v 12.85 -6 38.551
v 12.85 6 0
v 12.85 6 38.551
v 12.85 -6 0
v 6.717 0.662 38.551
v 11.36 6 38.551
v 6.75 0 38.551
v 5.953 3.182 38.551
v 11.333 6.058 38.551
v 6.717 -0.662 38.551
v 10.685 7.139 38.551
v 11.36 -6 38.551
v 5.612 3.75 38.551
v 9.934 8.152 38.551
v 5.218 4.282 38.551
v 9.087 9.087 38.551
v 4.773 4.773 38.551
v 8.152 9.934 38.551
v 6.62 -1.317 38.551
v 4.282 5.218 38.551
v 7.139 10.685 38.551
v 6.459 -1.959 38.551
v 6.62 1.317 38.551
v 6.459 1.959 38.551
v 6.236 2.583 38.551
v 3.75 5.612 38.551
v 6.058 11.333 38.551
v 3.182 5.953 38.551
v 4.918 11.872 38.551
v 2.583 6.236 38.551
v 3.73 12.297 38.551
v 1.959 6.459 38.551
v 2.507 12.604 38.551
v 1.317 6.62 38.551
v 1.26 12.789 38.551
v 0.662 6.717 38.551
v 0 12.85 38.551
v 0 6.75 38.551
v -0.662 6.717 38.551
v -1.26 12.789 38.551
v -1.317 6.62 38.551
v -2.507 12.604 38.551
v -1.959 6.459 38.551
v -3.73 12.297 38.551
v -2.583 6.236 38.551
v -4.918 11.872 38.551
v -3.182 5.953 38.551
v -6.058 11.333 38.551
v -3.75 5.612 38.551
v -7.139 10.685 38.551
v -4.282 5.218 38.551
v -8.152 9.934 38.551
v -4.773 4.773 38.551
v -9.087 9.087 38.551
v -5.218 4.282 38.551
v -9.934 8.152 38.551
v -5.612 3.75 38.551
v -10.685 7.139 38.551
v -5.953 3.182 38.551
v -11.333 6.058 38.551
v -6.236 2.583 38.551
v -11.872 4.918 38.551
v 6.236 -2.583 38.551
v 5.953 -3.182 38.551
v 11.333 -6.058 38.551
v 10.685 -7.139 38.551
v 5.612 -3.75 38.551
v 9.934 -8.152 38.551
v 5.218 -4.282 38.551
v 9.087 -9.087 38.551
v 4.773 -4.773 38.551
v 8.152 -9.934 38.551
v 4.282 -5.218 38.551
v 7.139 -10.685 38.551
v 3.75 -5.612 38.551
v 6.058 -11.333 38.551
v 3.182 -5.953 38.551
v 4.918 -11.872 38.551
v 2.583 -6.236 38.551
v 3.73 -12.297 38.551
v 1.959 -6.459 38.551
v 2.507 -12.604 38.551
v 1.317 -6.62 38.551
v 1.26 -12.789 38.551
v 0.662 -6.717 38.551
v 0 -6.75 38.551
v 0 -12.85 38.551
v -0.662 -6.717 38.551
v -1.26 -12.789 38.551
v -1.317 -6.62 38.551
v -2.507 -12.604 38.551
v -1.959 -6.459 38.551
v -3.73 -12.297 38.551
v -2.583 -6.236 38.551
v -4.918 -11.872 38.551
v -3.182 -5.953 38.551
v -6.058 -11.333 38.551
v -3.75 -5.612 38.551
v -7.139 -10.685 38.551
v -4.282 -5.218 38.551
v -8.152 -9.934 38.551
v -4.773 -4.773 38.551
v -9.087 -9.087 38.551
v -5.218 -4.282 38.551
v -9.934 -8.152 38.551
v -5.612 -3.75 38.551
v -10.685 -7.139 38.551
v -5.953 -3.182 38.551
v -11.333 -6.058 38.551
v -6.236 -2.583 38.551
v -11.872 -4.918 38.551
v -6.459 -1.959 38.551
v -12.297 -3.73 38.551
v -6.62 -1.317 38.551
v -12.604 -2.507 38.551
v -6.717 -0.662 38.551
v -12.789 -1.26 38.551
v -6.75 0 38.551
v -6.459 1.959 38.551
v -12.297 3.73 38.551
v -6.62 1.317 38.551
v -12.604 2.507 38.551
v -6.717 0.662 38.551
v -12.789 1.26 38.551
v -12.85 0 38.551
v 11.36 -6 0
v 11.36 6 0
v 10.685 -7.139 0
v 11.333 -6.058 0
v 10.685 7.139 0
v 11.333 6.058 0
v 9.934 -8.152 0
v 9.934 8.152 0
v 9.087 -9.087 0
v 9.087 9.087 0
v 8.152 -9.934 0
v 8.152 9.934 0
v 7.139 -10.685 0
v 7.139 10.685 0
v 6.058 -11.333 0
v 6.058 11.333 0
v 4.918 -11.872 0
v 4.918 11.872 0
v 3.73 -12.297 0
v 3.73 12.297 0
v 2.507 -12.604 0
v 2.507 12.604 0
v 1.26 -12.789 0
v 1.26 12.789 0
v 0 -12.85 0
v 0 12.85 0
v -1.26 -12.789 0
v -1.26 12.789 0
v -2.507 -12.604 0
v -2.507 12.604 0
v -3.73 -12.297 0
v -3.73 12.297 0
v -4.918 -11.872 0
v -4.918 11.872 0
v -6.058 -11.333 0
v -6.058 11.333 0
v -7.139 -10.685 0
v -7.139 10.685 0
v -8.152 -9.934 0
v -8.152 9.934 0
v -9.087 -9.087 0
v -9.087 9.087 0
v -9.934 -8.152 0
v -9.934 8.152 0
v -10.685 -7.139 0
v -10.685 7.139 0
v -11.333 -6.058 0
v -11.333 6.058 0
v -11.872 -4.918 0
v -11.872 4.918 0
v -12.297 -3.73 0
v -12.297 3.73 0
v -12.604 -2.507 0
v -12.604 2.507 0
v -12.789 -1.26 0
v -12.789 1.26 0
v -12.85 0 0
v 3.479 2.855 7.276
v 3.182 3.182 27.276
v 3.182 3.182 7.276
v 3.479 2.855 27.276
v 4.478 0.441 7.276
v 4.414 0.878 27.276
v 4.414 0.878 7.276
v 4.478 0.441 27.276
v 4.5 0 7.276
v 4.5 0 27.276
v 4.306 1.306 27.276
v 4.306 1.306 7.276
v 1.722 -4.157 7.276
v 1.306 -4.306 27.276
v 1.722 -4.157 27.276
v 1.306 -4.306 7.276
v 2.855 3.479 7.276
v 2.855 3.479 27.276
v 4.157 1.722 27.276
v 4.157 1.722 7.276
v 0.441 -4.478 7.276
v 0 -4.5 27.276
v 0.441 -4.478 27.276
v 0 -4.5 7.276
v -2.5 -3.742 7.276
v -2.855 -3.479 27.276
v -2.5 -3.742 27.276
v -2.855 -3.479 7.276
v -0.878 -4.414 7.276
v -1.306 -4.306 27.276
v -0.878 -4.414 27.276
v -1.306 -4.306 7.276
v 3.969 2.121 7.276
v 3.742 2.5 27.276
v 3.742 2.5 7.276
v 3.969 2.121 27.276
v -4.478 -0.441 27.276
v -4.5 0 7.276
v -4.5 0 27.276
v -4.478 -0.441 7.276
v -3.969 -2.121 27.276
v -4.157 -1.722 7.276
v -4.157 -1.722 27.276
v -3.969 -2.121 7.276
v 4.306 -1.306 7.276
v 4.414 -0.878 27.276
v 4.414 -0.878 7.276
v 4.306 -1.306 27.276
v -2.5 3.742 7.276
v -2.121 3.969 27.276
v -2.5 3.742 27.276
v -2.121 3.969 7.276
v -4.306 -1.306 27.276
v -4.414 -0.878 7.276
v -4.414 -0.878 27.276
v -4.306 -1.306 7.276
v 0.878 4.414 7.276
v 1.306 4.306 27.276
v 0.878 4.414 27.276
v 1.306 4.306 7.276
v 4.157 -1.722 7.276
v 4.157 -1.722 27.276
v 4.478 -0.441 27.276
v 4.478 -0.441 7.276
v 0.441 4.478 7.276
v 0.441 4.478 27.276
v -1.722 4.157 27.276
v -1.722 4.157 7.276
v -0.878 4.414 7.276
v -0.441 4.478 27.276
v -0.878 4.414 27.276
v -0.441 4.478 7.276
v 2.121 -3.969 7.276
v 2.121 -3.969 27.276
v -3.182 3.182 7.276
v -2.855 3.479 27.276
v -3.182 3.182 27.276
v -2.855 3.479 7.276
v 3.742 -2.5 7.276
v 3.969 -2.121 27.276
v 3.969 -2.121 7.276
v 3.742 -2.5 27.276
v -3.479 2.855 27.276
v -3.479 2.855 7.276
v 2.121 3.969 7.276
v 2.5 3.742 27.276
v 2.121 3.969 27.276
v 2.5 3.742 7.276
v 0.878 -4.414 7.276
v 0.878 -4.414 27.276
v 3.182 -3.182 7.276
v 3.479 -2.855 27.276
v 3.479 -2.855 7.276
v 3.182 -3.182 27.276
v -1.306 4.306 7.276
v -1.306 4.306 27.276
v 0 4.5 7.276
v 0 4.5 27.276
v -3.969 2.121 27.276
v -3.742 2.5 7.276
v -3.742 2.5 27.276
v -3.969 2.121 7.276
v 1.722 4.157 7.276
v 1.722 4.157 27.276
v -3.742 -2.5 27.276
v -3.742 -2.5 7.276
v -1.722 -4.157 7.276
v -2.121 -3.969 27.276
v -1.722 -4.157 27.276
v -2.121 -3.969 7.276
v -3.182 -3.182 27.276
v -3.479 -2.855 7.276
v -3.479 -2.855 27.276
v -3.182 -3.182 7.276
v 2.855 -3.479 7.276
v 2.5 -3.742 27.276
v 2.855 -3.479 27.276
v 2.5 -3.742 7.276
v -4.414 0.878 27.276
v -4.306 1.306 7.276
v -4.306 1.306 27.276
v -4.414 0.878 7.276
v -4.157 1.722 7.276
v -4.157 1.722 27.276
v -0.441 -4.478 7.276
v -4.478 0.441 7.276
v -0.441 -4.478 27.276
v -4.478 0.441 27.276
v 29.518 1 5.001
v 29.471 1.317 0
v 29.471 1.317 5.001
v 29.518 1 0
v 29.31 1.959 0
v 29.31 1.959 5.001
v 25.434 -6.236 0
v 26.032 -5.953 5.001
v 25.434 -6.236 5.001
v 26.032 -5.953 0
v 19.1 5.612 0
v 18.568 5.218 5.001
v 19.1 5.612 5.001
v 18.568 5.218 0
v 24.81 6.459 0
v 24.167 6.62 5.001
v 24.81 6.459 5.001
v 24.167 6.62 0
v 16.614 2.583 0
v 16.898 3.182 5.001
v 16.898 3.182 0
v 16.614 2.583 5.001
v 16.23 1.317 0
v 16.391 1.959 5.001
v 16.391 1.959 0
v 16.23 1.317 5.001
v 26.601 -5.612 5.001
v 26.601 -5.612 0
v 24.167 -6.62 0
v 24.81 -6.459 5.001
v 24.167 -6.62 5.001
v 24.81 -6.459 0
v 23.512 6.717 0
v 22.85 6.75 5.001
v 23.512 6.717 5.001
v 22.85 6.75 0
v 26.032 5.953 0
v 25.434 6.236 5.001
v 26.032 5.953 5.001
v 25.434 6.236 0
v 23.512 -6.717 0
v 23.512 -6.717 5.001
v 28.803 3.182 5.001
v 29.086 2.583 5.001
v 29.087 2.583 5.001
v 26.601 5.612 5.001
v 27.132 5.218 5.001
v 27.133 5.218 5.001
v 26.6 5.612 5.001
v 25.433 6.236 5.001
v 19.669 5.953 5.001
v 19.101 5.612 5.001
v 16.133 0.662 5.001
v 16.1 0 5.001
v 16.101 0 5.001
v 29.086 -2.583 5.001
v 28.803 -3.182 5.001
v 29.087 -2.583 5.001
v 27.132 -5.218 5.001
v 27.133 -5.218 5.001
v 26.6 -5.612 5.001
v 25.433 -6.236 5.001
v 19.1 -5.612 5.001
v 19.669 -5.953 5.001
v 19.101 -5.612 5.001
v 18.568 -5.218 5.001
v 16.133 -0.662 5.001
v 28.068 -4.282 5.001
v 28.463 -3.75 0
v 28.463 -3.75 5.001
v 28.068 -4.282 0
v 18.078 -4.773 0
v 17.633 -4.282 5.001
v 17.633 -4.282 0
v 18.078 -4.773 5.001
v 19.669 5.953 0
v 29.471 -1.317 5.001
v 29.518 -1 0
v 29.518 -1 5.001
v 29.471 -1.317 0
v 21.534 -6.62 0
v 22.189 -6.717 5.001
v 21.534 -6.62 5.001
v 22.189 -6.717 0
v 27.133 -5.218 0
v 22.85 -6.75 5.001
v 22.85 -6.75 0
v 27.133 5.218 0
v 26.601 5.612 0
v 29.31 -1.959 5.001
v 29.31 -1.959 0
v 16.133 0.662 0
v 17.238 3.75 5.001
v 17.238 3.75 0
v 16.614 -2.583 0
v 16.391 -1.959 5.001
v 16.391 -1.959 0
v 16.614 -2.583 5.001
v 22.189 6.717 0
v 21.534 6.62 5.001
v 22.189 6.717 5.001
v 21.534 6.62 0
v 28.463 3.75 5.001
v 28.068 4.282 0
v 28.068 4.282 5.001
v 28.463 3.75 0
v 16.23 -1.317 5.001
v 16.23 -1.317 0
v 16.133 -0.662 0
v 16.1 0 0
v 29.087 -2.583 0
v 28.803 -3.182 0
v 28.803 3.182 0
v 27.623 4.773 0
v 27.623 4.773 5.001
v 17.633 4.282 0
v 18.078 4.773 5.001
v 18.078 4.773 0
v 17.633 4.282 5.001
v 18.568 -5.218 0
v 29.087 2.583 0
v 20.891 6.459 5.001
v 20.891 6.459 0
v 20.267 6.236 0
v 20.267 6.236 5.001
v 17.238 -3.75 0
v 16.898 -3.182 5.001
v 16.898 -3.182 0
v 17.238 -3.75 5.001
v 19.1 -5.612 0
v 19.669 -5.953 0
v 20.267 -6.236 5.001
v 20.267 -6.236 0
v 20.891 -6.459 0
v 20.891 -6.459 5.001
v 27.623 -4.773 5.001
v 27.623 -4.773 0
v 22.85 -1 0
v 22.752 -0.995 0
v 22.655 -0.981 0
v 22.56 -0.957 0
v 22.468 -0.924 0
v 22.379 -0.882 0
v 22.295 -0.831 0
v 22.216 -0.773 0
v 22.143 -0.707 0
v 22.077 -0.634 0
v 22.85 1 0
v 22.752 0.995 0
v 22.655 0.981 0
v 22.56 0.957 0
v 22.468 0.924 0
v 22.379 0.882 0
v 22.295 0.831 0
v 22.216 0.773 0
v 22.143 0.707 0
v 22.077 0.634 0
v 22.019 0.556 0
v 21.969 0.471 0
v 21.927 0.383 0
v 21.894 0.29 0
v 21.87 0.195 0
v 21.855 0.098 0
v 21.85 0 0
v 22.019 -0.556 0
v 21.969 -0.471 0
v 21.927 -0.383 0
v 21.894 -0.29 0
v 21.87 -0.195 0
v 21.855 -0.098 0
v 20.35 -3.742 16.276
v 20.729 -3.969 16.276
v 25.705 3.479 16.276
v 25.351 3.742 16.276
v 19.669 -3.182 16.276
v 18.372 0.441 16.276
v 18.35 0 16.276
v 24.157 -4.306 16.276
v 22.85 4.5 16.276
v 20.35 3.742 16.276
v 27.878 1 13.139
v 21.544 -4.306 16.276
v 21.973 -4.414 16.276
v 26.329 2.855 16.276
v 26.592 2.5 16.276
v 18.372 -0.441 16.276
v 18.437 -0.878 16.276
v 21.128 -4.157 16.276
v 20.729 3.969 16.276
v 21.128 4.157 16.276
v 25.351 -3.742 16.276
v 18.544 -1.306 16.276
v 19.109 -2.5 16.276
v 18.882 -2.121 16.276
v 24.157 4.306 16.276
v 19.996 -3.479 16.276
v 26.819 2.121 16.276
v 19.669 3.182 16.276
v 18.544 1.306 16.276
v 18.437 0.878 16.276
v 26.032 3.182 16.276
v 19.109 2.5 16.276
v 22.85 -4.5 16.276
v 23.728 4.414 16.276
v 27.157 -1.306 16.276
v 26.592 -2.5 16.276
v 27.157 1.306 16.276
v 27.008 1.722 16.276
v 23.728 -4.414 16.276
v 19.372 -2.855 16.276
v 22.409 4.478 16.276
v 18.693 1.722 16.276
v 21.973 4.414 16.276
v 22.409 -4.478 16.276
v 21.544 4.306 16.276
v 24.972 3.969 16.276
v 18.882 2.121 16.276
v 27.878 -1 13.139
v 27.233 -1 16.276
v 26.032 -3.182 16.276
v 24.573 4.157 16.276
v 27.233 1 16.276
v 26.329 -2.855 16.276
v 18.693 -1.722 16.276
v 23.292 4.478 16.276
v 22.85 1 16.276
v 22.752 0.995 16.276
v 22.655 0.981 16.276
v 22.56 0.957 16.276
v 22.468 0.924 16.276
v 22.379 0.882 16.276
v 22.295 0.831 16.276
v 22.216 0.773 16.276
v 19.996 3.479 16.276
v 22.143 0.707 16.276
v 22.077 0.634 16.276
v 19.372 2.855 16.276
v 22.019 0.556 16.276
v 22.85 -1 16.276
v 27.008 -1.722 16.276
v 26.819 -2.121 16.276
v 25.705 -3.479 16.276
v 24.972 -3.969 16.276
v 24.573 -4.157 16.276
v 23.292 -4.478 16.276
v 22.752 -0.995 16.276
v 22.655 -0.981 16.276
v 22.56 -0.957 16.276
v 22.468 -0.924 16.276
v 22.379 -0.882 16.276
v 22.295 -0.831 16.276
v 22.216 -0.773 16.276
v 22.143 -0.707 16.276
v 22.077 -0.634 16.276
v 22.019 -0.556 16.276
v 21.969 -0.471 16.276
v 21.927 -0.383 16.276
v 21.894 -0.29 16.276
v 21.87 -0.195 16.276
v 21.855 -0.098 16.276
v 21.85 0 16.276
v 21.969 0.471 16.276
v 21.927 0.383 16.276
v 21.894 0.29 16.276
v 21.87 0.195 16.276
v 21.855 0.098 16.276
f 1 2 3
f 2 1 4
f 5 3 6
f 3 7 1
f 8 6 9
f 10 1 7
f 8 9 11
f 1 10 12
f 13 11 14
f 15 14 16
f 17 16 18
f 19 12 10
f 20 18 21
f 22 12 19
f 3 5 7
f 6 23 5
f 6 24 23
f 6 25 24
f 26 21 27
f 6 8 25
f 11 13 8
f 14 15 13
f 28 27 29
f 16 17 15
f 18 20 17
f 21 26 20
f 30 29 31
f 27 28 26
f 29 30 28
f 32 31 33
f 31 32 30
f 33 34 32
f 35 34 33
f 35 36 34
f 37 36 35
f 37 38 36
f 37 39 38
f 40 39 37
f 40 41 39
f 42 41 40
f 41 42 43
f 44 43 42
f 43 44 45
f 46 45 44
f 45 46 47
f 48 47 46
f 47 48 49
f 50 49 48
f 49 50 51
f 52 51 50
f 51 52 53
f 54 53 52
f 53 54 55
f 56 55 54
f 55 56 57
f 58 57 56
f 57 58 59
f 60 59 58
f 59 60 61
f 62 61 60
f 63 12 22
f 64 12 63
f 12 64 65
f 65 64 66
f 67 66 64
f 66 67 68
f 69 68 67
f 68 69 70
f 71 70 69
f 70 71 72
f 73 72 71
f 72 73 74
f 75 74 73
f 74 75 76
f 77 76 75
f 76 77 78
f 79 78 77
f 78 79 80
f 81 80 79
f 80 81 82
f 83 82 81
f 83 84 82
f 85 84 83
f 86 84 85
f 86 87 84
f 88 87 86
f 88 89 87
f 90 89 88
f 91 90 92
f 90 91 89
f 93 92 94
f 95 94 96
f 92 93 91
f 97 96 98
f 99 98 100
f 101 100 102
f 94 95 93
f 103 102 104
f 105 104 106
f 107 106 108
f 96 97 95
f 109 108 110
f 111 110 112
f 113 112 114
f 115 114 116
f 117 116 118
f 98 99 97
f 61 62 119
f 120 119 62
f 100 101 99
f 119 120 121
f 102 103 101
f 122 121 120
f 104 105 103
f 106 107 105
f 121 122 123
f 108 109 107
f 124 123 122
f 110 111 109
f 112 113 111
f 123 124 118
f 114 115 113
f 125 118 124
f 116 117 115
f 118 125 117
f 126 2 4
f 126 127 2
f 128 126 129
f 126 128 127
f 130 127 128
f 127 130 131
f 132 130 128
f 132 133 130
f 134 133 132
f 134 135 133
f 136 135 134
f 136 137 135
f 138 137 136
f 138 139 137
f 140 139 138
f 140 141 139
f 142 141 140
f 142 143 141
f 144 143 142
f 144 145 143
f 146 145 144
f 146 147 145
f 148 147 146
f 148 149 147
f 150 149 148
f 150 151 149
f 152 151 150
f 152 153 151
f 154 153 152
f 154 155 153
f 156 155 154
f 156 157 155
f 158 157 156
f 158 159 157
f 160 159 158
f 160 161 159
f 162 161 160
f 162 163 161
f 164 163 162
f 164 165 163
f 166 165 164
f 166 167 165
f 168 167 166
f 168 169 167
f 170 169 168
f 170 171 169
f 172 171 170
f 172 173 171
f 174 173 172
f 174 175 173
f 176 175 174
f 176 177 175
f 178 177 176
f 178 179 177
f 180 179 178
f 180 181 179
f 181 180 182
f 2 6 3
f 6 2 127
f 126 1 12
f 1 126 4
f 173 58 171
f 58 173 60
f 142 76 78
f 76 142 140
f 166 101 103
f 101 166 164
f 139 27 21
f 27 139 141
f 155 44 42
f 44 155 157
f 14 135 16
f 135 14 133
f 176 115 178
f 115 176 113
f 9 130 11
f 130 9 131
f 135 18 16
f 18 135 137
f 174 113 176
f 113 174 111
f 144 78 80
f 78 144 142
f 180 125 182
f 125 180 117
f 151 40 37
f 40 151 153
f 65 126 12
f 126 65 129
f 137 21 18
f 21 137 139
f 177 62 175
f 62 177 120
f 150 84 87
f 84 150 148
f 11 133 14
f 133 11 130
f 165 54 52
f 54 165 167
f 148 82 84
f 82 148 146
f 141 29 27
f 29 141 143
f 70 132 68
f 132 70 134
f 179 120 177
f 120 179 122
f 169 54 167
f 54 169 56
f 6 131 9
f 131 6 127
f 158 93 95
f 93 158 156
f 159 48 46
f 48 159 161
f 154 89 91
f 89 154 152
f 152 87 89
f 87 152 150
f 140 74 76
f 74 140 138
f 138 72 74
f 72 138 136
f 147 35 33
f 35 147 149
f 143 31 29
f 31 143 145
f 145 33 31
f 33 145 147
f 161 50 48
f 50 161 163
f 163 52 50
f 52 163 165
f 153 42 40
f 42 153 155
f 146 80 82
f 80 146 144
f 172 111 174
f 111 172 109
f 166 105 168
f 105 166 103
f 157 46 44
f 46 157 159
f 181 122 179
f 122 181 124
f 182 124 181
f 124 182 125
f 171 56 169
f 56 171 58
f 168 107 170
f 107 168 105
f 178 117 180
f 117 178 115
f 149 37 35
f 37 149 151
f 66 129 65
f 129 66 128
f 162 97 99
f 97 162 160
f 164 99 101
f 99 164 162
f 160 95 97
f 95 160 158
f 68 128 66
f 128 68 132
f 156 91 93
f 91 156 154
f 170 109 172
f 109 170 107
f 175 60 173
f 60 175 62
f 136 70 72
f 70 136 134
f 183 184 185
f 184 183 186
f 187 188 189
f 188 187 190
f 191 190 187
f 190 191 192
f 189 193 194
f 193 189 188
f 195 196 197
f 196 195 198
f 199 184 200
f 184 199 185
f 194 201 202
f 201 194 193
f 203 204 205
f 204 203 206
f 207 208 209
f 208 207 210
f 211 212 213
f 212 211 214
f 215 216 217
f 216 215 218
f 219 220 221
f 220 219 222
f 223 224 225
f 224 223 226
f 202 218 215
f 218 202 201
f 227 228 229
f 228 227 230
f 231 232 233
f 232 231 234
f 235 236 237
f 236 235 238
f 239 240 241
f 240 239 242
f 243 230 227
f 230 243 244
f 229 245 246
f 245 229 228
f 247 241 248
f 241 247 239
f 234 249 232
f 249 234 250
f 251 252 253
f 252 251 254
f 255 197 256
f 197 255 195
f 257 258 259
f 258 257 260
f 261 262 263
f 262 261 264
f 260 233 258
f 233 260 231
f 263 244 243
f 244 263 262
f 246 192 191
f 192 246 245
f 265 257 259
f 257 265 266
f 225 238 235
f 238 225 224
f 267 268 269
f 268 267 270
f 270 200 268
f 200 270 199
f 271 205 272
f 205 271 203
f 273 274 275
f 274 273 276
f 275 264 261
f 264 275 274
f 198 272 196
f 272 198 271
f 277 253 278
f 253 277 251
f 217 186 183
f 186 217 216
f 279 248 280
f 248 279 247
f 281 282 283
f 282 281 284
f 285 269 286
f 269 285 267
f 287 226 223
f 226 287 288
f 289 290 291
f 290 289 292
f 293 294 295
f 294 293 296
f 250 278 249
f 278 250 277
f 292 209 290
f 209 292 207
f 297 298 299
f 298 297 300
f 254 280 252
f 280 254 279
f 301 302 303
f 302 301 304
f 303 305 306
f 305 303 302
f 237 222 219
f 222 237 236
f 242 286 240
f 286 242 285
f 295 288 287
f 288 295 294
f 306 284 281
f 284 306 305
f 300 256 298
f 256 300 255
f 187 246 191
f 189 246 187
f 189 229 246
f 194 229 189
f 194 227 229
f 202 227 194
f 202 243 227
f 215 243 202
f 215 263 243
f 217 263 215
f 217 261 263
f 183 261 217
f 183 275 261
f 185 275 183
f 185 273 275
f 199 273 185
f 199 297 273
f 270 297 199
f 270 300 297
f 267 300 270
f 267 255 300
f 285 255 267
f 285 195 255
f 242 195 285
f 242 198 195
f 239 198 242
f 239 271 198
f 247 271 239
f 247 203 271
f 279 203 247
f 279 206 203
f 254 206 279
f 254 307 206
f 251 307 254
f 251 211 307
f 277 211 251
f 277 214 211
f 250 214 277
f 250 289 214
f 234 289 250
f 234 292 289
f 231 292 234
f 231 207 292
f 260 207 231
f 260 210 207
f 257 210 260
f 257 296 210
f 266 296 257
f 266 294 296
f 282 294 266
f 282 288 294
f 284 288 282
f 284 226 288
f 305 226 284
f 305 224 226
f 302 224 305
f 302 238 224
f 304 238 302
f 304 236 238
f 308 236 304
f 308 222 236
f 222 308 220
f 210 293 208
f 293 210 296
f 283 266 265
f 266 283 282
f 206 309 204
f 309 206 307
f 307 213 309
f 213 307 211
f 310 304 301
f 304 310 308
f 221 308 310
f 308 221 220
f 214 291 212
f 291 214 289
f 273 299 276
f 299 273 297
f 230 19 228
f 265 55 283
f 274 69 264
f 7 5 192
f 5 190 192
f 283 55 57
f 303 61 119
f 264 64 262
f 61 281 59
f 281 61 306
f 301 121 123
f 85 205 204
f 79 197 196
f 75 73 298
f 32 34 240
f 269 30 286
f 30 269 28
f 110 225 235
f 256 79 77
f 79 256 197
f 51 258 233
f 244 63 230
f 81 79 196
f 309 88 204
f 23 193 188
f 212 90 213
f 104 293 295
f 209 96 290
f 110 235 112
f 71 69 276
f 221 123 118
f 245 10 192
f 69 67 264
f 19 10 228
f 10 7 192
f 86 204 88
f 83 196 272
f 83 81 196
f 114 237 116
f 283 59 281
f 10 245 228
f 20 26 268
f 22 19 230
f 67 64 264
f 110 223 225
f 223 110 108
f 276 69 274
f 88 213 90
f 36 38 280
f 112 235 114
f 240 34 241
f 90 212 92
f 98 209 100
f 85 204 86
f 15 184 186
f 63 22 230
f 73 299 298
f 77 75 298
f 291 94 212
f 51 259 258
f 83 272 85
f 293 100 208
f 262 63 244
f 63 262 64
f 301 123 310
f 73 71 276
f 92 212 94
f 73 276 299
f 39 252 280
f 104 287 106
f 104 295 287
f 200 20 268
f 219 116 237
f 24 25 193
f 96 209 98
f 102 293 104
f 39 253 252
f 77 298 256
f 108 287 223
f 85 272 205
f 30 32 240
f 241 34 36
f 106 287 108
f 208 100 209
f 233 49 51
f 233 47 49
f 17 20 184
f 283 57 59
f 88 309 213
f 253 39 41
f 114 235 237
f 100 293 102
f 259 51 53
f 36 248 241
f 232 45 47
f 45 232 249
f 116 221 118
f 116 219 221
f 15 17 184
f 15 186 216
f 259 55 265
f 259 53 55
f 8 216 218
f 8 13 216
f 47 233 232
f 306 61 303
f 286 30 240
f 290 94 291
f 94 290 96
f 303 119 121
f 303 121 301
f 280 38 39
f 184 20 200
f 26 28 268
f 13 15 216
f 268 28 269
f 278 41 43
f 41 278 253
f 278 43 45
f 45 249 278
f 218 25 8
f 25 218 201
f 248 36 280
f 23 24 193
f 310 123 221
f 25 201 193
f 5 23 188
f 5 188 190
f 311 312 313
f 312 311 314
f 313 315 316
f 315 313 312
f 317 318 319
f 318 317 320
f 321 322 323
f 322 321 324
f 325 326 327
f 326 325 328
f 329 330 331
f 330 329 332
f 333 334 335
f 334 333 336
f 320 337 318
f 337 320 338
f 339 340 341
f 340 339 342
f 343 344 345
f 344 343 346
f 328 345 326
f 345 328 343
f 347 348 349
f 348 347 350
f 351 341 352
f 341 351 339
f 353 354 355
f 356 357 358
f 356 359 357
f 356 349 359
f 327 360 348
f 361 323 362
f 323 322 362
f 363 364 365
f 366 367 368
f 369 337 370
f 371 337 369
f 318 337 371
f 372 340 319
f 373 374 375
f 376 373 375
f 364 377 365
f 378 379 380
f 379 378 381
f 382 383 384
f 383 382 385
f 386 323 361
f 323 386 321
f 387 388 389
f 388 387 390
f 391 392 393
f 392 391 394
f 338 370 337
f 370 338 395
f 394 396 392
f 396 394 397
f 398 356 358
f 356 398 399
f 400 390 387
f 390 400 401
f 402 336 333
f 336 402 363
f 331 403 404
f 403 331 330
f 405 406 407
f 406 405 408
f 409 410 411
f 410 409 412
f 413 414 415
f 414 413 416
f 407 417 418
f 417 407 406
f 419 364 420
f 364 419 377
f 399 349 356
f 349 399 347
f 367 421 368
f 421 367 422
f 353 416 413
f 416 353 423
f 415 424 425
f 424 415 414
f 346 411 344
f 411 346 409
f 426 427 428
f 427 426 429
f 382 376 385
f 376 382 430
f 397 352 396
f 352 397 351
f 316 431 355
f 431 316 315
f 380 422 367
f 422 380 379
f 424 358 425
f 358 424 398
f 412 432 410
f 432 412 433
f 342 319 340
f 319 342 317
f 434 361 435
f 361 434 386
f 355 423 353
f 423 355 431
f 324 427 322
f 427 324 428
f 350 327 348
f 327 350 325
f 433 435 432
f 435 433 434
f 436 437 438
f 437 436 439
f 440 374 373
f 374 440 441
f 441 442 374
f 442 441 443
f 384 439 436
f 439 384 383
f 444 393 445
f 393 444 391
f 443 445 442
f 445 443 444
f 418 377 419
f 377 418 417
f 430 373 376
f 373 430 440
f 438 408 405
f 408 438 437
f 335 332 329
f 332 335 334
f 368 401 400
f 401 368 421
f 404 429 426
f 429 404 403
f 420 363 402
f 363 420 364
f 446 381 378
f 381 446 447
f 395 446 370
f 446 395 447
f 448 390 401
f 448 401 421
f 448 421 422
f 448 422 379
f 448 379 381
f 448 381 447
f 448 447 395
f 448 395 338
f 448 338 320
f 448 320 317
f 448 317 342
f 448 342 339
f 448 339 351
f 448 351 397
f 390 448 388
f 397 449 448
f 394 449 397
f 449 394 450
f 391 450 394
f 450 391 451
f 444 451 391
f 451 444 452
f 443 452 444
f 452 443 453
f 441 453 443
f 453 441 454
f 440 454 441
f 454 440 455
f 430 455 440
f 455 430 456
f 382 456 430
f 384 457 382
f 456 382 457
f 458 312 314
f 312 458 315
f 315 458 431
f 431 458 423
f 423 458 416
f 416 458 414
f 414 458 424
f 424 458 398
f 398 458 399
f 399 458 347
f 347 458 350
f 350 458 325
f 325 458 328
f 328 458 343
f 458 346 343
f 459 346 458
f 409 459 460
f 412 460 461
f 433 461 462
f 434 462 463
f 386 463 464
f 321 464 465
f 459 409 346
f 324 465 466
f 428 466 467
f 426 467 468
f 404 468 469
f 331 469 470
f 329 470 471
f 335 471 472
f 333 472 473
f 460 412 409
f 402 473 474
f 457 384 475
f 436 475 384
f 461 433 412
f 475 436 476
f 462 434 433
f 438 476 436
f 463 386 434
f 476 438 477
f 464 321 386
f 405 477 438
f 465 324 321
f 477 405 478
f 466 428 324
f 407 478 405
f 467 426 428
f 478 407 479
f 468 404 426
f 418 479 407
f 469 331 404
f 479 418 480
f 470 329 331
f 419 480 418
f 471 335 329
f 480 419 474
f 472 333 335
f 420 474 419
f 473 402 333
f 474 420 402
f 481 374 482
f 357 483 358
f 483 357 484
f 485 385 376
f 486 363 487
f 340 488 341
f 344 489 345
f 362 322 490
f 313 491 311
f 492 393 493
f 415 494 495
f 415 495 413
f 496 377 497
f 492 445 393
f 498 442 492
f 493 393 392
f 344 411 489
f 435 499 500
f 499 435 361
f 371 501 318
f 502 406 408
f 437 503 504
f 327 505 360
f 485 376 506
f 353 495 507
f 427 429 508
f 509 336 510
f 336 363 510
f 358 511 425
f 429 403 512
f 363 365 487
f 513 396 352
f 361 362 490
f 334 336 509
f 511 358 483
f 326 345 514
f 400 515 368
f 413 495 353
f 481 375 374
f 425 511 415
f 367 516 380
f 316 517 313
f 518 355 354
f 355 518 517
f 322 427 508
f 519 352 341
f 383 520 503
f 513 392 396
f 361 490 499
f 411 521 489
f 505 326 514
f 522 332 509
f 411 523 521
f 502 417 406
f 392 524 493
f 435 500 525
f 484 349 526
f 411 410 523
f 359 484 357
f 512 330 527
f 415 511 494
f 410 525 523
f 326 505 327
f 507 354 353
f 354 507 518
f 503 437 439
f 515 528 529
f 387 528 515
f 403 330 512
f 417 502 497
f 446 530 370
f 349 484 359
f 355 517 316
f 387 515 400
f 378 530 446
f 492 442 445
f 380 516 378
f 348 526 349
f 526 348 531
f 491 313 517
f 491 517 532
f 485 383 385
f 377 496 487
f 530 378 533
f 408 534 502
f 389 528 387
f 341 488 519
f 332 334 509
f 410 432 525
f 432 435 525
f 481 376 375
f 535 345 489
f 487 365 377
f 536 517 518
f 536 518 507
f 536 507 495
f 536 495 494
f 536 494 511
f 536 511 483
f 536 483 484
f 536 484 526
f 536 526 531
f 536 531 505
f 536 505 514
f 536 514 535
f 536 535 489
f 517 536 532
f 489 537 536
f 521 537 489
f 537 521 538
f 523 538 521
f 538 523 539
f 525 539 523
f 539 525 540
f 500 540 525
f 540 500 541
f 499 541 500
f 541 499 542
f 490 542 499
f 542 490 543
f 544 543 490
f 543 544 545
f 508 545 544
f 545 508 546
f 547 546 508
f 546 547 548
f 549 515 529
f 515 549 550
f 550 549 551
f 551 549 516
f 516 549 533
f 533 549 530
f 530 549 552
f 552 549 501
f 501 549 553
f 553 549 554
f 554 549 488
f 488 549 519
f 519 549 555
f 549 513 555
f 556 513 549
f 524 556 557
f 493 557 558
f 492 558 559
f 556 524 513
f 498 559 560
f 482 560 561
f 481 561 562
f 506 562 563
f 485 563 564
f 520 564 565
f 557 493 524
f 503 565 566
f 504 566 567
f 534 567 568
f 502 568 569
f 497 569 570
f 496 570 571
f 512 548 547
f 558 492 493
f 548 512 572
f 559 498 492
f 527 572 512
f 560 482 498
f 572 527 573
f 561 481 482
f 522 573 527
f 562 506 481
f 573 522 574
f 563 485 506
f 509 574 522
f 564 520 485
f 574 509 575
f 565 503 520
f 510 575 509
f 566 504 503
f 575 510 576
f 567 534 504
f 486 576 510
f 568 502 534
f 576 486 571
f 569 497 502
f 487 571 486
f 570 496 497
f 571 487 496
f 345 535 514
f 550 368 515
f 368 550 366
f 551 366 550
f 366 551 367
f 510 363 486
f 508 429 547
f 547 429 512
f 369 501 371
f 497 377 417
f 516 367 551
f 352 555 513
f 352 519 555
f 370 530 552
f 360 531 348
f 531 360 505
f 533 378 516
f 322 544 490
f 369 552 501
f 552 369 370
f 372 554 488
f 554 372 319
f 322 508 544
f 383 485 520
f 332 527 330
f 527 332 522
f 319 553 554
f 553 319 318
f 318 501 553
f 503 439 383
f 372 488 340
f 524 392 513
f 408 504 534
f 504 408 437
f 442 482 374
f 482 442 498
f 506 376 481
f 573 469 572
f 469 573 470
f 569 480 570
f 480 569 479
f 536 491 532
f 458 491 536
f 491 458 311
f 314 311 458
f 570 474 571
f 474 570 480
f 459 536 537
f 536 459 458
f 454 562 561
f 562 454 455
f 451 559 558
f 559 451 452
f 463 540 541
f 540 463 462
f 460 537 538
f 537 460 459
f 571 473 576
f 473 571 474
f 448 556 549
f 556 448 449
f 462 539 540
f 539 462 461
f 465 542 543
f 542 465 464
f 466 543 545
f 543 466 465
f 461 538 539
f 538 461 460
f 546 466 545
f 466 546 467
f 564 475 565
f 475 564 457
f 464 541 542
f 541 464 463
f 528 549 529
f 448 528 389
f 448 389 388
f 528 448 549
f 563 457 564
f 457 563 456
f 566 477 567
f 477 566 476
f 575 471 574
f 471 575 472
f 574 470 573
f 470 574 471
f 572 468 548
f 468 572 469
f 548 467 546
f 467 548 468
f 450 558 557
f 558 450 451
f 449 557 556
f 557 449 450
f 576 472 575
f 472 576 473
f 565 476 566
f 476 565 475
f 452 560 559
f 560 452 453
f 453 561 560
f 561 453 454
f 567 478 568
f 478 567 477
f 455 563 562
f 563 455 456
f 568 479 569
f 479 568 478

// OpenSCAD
volume = 40;
aspect = 1.5;
plugRatio = 1.5;
probeLength = 20;
probeThickness = 8;
probeTolerance = 0.5;
topExtra = 2;
cableHoleDiameter = 2;
plugStickout = 5;
attachmentWidth = 12;

// volume = 4 aspect pi r^3

r = pow(volume*1000/(4*aspect*PI),1/3);

$fn = 64;

h = aspect*2*r;
nudge = 0.001;

plugR1=probeThickness/2+probeTolerance;
plugR2=plugR1*plugRatio;

module buffer() {
    difference() {
        union() {
            translate([r-attachmentWidth,-attachmentWidth/2,0]) cube([attachmentWidth,attachmentWidth,h]);
            cylinder(r=r,h=h);
        }
        translate([0,0,h/2-probeLength/2-topExtra]) {
            cylinder(r=probeThickness/2+probeTolerance,h=probeLength+nudge);
            translate([0,0,probeLength]) cylinder(r1=plugR1,r2=plugR2,h=h/2-probeLength/2+topExtra+nudge);
        }
    }

}

module plug() {
    difference() {
        union() {
            cylinder(h=plugStickout+nudge,r=plugR2);
            translate([0,0,plugStickout]) cylinder(r1=plugR2,r2=plugR1,h=topExtra+h/2-probeLength/2);
        }
        translate([0,0,-nudge]) linear_extrude(height=plugStickout+topExtra+h/2-probeLength/2+2*nudge) hull() {
            circle(d=cableHoleDiameter);
            translate([plugR2,0]) square(cableHoleDiameter,center=true);
        }
    }
}

echo("bottom wall", h/2-probeLength/2-topExtra);
echo("side wall", r-probeThickness/2-probeTolerance);

buffer();
translate([r+10,0,0]) plug();
